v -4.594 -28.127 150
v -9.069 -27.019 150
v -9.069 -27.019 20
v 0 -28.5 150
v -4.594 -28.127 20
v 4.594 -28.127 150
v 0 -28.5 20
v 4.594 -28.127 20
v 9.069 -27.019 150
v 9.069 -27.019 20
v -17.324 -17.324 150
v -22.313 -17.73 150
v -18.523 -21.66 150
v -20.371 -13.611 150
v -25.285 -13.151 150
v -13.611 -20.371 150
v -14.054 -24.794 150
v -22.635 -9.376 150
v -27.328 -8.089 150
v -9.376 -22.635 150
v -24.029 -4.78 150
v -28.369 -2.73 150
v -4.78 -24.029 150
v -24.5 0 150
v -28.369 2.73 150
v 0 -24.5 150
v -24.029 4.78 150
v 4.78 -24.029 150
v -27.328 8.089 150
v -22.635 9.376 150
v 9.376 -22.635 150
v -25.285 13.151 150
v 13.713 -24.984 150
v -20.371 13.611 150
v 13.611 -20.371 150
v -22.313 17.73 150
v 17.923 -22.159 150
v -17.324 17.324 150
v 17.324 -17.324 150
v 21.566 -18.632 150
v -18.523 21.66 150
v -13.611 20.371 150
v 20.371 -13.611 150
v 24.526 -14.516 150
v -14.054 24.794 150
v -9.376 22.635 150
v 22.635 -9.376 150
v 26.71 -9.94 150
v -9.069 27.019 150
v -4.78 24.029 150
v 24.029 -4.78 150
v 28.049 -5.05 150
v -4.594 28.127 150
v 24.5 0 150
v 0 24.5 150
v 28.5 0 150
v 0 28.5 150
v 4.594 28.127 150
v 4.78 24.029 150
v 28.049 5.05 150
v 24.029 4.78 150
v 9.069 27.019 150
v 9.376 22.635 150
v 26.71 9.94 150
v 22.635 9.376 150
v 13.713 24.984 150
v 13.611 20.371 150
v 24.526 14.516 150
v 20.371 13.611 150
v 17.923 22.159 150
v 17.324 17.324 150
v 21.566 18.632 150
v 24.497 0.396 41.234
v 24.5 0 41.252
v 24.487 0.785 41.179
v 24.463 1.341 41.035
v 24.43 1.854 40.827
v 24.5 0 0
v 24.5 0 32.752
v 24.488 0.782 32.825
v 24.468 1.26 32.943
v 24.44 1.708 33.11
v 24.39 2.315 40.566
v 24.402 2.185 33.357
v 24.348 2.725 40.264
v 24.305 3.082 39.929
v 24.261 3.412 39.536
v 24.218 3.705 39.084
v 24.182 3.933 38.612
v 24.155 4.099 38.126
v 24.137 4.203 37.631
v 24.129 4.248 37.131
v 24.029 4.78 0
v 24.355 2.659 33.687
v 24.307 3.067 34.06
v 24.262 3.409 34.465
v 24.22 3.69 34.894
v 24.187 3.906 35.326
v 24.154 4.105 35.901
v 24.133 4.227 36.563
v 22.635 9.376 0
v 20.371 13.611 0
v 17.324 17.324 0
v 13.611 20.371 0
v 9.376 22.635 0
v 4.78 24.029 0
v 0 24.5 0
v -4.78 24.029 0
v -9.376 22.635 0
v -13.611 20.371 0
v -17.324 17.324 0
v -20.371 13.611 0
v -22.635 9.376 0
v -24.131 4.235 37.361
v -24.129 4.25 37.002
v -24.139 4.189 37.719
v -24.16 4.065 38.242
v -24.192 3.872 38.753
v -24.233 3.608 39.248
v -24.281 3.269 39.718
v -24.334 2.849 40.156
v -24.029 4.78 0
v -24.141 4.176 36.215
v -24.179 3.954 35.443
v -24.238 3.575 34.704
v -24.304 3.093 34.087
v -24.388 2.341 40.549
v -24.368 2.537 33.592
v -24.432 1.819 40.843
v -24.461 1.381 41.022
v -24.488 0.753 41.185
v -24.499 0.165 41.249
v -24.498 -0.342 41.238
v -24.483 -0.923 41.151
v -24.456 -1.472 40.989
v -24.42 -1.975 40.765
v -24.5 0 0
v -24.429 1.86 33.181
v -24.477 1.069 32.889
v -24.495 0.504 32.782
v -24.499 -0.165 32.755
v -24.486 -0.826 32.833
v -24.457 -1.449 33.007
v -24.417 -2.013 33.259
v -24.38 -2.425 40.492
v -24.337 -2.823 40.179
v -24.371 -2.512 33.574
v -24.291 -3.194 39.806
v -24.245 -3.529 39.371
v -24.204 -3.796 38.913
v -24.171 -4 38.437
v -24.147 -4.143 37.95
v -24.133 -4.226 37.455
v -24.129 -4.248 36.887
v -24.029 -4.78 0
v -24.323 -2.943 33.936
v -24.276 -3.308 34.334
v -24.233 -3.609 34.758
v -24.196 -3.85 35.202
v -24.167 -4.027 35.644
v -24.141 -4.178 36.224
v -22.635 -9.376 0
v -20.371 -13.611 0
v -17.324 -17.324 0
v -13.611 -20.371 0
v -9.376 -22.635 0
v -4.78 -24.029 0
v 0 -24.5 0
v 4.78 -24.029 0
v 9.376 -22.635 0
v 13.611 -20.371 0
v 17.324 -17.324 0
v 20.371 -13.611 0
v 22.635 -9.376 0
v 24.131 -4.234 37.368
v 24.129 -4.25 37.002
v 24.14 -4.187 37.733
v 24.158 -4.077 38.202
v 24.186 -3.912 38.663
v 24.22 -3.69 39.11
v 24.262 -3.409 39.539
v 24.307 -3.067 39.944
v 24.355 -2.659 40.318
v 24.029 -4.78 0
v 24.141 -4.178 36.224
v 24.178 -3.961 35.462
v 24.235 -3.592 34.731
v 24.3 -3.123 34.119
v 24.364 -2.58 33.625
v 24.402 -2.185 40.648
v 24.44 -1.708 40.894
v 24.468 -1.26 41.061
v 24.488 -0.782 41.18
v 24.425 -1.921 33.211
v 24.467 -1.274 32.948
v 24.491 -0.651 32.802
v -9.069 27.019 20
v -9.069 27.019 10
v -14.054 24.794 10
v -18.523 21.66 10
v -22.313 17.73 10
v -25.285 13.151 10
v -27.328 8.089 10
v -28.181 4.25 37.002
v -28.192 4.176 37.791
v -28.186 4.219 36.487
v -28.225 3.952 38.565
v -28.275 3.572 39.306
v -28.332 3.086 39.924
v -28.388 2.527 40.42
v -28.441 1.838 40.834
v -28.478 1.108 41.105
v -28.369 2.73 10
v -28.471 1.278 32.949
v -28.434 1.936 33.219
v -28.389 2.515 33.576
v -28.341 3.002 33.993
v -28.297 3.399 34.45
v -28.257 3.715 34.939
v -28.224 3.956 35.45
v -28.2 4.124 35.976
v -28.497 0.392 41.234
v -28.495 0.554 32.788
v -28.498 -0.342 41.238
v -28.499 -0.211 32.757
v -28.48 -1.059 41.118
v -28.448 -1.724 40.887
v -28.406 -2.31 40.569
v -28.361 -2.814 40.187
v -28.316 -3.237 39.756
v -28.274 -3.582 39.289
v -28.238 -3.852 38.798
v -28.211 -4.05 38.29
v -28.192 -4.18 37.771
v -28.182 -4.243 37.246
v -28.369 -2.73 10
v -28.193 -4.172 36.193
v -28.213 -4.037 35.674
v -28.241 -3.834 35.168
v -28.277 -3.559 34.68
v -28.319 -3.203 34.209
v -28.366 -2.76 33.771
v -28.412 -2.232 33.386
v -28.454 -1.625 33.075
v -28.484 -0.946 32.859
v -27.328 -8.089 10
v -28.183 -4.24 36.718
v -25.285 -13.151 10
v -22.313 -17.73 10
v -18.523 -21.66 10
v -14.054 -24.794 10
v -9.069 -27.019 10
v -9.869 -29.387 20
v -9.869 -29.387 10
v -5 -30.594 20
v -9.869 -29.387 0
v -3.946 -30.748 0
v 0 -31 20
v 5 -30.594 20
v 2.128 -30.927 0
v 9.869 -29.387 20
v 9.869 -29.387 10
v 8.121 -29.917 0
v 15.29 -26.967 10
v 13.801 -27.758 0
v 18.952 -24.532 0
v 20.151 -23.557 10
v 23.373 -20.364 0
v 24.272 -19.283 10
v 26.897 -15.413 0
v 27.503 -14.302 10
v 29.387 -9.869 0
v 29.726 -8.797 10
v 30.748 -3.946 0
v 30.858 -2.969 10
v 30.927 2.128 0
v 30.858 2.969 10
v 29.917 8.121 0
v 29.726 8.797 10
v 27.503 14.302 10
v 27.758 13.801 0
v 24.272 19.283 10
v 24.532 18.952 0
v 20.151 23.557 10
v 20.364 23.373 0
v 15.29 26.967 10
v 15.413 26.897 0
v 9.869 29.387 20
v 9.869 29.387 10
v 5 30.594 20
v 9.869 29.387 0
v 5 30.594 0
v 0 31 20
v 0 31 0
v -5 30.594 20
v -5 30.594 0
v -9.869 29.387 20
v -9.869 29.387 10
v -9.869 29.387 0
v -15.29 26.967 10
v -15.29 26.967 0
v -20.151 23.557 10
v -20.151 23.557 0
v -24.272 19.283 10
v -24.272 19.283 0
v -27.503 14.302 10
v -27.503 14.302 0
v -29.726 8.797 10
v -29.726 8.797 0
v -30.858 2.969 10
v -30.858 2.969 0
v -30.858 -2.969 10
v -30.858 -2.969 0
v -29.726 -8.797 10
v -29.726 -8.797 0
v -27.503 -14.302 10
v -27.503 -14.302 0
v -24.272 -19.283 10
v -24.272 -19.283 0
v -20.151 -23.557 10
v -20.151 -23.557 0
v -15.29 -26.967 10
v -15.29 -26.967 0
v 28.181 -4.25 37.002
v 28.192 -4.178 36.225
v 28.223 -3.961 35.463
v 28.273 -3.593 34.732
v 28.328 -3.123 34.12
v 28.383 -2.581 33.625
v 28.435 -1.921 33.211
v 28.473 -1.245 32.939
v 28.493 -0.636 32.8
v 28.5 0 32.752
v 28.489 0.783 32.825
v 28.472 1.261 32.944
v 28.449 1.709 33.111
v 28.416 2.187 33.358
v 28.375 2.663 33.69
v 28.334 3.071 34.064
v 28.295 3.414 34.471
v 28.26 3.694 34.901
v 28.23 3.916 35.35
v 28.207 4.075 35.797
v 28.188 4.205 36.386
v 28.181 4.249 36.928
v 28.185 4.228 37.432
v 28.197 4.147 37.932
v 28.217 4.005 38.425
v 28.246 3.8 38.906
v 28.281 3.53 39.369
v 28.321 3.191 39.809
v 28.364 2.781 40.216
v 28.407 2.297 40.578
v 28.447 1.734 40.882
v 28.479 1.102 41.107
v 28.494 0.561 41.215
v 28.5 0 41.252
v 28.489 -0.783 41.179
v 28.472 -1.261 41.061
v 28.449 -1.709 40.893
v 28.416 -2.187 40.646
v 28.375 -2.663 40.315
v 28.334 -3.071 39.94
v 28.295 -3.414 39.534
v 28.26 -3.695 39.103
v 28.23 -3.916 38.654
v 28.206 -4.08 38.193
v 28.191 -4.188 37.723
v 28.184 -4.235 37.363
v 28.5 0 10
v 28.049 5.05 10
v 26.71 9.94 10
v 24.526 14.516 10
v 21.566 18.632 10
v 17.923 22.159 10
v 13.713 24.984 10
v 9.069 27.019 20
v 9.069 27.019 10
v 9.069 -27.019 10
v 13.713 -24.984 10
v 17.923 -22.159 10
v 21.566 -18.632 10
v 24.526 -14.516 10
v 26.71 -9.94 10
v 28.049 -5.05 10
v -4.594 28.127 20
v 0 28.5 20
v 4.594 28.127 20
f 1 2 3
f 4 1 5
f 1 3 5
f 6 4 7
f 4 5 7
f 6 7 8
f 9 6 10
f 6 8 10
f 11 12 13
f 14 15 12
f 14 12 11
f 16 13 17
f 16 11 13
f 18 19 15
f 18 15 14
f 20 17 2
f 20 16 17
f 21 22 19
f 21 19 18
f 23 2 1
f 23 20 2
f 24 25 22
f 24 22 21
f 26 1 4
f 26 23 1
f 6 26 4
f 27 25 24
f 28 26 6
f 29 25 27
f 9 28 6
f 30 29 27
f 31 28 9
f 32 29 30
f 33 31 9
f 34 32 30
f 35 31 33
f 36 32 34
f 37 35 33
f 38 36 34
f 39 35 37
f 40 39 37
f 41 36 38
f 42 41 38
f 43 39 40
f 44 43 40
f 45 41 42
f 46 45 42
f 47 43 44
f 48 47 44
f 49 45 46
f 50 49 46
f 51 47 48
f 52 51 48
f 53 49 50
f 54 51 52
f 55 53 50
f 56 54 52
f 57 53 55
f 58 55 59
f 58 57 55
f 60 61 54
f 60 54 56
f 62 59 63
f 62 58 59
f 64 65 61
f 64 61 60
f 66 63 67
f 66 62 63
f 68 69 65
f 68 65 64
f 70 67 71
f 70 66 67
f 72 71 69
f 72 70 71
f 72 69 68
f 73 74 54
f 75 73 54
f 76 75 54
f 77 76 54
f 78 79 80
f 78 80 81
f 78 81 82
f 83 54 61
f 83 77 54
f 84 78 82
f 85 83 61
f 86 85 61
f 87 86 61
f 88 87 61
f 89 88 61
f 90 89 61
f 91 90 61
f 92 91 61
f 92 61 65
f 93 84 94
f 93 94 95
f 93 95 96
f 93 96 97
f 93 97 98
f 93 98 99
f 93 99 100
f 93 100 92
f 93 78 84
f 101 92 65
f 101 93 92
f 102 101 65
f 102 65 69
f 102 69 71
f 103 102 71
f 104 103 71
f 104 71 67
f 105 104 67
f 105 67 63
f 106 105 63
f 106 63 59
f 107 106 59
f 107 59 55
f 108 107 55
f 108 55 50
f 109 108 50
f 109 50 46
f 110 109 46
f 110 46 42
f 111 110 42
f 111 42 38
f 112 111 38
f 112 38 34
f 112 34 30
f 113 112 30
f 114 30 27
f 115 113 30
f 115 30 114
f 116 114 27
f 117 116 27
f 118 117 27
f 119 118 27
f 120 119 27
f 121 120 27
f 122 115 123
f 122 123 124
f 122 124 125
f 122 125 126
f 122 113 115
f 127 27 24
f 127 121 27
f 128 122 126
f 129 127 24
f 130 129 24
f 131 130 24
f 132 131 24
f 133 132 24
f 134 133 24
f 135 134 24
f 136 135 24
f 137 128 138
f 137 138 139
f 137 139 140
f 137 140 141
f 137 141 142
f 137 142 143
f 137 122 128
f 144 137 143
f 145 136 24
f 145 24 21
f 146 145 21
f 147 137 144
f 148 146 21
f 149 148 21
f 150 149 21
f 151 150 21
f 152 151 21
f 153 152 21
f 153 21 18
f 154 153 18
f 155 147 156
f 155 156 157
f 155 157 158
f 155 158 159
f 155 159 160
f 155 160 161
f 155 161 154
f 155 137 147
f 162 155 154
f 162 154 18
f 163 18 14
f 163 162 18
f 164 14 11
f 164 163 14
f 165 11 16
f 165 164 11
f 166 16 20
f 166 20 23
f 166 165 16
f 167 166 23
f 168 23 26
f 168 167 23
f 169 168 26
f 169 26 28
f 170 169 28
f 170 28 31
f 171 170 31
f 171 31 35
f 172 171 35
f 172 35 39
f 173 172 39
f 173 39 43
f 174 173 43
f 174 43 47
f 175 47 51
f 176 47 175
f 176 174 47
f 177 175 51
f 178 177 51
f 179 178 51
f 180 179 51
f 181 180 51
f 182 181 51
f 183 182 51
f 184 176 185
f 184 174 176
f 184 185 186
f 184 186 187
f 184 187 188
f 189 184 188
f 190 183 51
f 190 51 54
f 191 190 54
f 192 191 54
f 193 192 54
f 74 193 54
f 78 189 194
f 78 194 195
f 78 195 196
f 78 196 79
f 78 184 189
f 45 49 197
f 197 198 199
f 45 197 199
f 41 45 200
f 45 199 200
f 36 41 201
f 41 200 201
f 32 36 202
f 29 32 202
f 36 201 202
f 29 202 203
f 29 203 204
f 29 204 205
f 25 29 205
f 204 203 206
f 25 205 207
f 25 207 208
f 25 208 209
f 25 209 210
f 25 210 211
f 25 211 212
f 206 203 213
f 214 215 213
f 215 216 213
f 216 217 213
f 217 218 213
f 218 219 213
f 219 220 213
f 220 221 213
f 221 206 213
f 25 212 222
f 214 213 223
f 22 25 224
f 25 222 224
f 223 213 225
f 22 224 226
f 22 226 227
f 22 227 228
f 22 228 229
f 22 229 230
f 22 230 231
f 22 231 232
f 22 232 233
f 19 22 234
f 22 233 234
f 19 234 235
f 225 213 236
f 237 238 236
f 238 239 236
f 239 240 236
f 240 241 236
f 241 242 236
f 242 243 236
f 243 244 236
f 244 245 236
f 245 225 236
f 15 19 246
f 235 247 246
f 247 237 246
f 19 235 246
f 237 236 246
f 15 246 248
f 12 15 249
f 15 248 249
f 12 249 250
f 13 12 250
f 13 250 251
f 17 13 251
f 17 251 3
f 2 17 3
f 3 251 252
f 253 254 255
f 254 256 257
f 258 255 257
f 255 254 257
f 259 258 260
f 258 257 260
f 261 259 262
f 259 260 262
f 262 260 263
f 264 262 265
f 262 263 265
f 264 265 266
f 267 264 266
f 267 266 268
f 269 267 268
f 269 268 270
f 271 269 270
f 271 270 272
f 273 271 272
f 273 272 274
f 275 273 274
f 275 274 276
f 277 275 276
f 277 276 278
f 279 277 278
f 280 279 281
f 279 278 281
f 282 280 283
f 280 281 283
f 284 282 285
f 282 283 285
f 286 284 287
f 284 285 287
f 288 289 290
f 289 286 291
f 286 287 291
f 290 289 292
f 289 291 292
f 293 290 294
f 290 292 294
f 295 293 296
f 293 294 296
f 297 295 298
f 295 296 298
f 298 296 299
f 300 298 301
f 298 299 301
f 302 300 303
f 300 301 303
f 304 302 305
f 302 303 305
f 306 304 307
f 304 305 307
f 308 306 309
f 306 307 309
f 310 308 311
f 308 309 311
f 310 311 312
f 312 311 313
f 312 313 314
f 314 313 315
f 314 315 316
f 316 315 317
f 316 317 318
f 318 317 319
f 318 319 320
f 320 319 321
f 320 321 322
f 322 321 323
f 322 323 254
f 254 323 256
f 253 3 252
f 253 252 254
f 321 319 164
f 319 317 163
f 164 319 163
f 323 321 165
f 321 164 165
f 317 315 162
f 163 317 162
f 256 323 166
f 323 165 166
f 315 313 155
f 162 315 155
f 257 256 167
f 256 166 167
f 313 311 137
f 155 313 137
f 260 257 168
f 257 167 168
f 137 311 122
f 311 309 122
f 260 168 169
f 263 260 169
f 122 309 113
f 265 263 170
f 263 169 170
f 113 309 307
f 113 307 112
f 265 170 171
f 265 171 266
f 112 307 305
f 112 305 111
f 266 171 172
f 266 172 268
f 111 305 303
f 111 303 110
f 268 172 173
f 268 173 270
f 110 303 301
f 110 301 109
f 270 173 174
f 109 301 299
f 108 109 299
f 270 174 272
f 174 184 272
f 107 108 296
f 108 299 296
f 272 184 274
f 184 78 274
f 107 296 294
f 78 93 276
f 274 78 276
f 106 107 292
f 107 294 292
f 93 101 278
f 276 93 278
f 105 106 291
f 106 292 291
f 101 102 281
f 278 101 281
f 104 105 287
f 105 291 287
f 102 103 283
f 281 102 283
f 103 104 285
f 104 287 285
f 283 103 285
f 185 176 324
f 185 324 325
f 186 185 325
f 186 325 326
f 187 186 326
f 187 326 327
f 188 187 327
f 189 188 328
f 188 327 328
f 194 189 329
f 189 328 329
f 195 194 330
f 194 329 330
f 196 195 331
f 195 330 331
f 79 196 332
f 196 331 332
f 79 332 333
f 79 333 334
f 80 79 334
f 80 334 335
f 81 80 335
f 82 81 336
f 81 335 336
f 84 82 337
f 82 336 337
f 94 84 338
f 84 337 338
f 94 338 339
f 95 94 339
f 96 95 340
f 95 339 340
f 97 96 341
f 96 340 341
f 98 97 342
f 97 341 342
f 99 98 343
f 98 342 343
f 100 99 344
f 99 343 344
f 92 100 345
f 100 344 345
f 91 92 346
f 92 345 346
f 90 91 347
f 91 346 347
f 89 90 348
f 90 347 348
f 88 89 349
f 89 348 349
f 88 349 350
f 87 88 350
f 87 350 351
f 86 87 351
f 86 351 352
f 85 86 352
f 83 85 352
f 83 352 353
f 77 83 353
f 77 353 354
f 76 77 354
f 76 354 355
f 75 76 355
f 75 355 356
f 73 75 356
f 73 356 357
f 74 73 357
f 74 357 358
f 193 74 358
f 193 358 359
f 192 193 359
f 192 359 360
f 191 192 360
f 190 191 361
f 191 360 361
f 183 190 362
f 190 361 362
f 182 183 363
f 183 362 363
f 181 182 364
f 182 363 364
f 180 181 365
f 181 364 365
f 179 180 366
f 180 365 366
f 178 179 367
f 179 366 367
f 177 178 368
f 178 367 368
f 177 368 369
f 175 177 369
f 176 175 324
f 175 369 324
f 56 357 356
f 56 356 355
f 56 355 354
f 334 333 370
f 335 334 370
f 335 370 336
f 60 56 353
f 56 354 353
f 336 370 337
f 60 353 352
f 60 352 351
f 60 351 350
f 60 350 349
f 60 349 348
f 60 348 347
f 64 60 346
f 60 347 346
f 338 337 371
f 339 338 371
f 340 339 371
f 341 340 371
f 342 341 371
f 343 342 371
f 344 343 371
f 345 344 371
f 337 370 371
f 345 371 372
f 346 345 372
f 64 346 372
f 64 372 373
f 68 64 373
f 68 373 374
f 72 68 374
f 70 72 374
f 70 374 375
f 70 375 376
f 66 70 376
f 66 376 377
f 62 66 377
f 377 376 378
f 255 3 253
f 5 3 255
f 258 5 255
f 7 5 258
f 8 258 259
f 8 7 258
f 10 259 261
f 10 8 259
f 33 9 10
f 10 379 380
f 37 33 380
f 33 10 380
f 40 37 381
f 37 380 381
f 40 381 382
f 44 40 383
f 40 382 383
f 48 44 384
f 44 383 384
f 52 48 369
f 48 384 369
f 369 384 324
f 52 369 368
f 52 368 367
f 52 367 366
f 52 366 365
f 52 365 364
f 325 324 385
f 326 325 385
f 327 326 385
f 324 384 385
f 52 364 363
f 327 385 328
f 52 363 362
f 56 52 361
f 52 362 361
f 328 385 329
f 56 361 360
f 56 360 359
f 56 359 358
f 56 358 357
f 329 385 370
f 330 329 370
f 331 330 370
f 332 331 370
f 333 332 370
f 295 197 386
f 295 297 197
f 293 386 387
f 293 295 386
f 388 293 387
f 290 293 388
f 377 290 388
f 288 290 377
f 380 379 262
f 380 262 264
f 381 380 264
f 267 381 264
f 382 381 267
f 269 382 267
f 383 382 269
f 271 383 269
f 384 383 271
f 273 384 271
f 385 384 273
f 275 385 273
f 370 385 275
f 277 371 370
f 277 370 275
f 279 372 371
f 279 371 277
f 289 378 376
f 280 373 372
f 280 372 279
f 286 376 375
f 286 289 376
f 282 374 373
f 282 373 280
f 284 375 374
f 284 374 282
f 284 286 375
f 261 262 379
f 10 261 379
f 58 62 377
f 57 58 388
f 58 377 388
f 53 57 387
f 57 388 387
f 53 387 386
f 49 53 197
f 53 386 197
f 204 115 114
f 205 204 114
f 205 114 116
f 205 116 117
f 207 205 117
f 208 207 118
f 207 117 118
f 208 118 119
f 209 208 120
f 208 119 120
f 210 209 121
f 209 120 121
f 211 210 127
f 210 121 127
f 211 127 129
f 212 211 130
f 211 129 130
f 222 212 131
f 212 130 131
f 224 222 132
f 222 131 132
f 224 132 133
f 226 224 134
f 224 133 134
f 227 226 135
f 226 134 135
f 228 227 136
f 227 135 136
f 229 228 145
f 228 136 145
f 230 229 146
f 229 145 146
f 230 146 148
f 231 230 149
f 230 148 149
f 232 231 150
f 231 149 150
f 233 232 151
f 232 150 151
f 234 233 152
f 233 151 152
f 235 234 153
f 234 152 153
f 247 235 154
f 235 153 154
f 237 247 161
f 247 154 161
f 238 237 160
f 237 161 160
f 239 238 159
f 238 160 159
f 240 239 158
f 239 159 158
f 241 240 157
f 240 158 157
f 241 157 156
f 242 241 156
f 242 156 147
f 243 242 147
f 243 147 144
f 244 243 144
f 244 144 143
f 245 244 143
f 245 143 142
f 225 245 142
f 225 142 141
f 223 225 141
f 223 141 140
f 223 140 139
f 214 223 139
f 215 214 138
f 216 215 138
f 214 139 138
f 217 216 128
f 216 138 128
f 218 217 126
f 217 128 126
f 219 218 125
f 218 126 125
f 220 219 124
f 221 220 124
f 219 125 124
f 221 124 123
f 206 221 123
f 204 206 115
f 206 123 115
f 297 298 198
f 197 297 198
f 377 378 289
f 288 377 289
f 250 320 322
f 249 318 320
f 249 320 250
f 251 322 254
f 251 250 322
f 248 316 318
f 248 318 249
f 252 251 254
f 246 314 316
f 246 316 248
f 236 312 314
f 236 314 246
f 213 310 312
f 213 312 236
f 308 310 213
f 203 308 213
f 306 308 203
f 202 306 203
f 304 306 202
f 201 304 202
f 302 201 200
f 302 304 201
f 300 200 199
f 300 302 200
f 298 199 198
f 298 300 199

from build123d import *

# Parameters (mm, degrees)
F1_DEPTH = 10
F0_R     = 24.5
F2_DEPTH = 150
F4_D     = 8.5
F4_DEPTH = 31.001
F5_D     = 8.5
F6_DEPTH = 20
F7_DEPTH = 20


with BuildPart() as f1:
    # F0 (on Top) → F1 (new body)
    with BuildSketch(Plane.XY):
        with BuildLine():
            ThreePointArc((-9.06851449, 27.018735073), (0, 28.5), (9.06851449, 27.018735073))
            Line((9.06851449, 27.018735073), (9.8690700263, 29.3870967742))
            ThreePointArc((9.8690700263, 29.3870967742), (0, 31), (-9.8690700263, 29.3870967742))
            Line((-9.8690700263, 29.3870967742), (-9.06851449, 27.018735073))
        make_face()
        with BuildLine():
            ThreePointArc((-9.06851449, -27.018735073), (-28.5, 0), (-9.06851449, 27.018735073))
            Line((-9.06851449, 27.018735073), (-9.8690700263, 29.3870967742))
            ThreePointArc((-9.8690700263, 29.3870967742), (-31, 0), (-9.8690700263, -29.3870967742))
            Line((-9.8690700263, -29.3870967742), (-9.06851449, -27.018735073))
        make_face()
        with BuildLine():
            Line((9.8690700263, -29.3870967742), (9.06851449, -27.018735073))
            ThreePointArc((9.06851449, -27.018735073), (0, -28.5), (-9.06851449, -27.018735073))
            Line((-9.06851449, -27.018735073), (-9.8690700263, -29.3870967742))
            ThreePointArc((-9.8690700263, -29.3870967742), (0, -31), (9.8690700263, -29.3870967742))
        make_face()
        with BuildLine():
            ThreePointArc((9.06851449, 27.018735073), (23.1376604583, 16.6402724893), (28.5, 0))
            ThreePointArc((28.5, 0), (23.1376604583, -16.6402724893), (9.06851449, -27.018735073))
            Line((9.06851449, -27.018735073), (9.8690700263, -29.3870967742))
            ThreePointArc((9.8690700263, -29.3870967742), (25.1688415587, -18.0977737469), (31, 0))
            ThreePointArc((31, 0), (25.1688415587, 18.0977737469), (9.8690700263, 29.3870967742))
            Line((9.8690700263, 29.3870967742), (9.06851449, 27.018735073))
        make_face()
    extrude(amount=F1_DEPTH)

    # F0 (on Top) → F2 (join)
    with BuildSketch(Plane.XY):
        with BuildLine():
            ThreePointArc((9.06851449, -27.018735073), (23.1376604583, -16.6402724893), (28.5, 0))
            ThreePointArc((28.5, 0), (23.1376604583, 16.6402724893), (9.06851449, 27.018735073))
            ThreePointArc((9.06851449, 27.018735073), (0, 28.5), (-9.06851449, 27.018735073))
            ThreePointArc((-9.06851449, 27.018735073), (-28.5, 0), (-9.06851449, -27.018735073))
            ThreePointArc((-9.06851449, -27.018735073), (0, -28.5), (9.06851449, -27.018735073))
        make_face()
        Circle(F0_R, mode=Mode.SUBTRACT)
    extrude(amount=F2_DEPTH)

    # F4 (through all, one way)
    with BuildSketch(Plane.YZ):
        with Locations((0, 37.0021536946)):
            Circle(F4_D / 2)
    extrude(amount=-F4_DEPTH, mode=Mode.SUBTRACT)

    # F5 (through all)
    with Locations(Plane(origin=(0, 0, 0), x_dir=(0, 1, 0), z_dir=(-1, 0, 0))):
        with Locations((0, -37.0021536946)):
            Hole(F5_D / 2)

    # F0 (on Top) → F6 (join)
    with BuildSketch(Plane.XY):
        with BuildLine():
            ThreePointArc((-9.06851449, 27.018735073), (0, 28.5), (9.06851449, 27.018735073))
            Line((9.06851449, 27.018735073), (9.8690700263, 29.3870967742))
            ThreePointArc((9.8690700263, 29.3870967742), (0, 31), (-9.8690700263, 29.3870967742))
            Line((-9.8690700263, 29.3870967742), (-9.06851449, 27.018735073))
        make_face()
    extrude(amount=F6_DEPTH)

    # F0 (on Top) → F7 (join)
    with BuildSketch(Plane.XY):
        with BuildLine():
            Line((9.8690700263, -29.3870967742), (9.06851449, -27.018735073))
            ThreePointArc((9.06851449, -27.018735073), (0, -28.5), (-9.06851449, -27.018735073))
            Line((-9.06851449, -27.018735073), (-9.8690700263, -29.3870967742))
            ThreePointArc((-9.8690700263, -29.3870967742), (0, -31), (9.8690700263, -29.3870967742))
        make_face()
    extrude(amount=F7_DEPTH)


solid = f1.part
